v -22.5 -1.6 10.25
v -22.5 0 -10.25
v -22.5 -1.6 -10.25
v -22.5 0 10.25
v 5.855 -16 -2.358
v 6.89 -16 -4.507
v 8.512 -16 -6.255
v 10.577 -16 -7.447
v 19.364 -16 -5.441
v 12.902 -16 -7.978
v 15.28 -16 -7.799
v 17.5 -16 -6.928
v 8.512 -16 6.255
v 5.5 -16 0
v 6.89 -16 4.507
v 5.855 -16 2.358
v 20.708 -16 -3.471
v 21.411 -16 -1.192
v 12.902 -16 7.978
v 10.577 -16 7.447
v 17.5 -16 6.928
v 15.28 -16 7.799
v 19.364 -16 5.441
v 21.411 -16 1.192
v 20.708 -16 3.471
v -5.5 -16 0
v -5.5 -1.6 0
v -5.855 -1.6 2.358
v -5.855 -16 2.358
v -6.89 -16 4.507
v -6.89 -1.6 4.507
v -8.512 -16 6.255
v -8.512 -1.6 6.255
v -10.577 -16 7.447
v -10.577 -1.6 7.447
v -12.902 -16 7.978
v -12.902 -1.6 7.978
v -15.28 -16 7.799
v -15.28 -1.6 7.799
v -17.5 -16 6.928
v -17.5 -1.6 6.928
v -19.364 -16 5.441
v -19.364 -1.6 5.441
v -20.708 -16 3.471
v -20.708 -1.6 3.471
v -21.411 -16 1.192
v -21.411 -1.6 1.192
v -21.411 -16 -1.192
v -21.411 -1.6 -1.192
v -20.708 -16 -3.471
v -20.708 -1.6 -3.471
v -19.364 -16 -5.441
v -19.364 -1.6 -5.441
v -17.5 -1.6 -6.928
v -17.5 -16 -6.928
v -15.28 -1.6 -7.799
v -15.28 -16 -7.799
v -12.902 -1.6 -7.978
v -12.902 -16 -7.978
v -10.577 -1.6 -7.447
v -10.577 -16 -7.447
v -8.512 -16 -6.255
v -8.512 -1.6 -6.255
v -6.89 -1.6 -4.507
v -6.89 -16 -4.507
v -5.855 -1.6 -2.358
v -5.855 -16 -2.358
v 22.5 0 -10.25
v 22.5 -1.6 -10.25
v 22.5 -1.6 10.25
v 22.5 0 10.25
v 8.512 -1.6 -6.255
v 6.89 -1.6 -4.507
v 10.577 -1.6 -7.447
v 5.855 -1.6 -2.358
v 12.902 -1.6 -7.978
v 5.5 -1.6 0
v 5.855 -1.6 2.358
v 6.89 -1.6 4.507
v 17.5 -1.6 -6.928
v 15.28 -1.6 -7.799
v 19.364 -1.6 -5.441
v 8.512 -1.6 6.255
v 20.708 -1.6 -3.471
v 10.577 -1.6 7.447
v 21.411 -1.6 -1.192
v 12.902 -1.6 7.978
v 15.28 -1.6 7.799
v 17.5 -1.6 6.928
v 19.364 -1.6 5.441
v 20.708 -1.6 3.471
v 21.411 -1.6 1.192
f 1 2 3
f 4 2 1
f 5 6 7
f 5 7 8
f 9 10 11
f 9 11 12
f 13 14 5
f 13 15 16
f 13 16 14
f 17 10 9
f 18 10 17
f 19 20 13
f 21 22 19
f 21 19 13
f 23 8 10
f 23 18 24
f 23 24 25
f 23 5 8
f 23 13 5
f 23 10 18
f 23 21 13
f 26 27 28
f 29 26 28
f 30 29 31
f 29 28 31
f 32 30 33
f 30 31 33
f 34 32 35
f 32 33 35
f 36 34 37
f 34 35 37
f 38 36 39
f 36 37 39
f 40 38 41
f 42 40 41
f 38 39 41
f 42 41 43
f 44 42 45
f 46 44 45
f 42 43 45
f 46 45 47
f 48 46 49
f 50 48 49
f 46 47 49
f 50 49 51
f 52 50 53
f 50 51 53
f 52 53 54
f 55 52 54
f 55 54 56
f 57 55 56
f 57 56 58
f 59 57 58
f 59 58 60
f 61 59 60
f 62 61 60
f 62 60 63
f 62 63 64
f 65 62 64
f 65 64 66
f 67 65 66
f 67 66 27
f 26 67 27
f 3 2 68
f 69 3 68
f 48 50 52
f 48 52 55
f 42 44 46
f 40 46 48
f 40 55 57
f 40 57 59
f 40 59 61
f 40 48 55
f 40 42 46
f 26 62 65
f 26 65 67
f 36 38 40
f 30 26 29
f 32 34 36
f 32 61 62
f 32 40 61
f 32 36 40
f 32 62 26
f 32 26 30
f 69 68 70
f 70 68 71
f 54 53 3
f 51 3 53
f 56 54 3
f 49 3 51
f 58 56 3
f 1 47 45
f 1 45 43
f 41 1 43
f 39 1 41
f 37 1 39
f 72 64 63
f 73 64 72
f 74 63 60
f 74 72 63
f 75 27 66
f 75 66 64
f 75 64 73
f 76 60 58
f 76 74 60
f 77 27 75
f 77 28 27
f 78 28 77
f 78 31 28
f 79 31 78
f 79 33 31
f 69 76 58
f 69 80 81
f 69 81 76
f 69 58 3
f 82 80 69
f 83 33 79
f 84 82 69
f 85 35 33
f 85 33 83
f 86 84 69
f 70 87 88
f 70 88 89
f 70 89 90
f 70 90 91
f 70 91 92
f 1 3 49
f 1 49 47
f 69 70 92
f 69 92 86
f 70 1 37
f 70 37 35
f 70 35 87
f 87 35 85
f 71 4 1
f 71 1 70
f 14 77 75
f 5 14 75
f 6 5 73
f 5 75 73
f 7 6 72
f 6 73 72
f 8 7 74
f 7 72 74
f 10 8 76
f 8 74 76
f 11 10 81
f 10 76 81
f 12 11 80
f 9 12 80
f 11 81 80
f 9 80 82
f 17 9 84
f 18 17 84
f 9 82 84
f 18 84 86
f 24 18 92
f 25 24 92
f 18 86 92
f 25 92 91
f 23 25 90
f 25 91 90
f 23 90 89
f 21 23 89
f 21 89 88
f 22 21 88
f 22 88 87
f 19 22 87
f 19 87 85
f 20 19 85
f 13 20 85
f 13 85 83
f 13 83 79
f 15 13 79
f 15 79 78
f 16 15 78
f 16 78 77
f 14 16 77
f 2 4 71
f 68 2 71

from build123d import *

# Parameters (mm, degrees)
F0_W     = 45
F0_H     = 20.5
F1_DEPTH = 1.6
F2_R     = 8
F3_DEPTH = 16


with BuildPart() as f1:
    # F0 (on Front) → F1 (new body)
    with BuildSketch(Plane.XZ):
        Rectangle(F0_W, F0_H)
    extrude(amount=F1_DEPTH)

    # F2 (on Front) → F3 (join)
    with BuildSketch(Plane.XZ):
        with Locations((-13.5, 0)):
            Circle(F2_R)
        with BuildLine():
            ThreePointArc((21.5, 0), (13.5, 8), (5.5, 0))
            ThreePointArc((5.5, 0), (13.5, -8), (21.5, 0))
        make_face()
    extrude(amount=F3_DEPTH)


solid = f1.part
